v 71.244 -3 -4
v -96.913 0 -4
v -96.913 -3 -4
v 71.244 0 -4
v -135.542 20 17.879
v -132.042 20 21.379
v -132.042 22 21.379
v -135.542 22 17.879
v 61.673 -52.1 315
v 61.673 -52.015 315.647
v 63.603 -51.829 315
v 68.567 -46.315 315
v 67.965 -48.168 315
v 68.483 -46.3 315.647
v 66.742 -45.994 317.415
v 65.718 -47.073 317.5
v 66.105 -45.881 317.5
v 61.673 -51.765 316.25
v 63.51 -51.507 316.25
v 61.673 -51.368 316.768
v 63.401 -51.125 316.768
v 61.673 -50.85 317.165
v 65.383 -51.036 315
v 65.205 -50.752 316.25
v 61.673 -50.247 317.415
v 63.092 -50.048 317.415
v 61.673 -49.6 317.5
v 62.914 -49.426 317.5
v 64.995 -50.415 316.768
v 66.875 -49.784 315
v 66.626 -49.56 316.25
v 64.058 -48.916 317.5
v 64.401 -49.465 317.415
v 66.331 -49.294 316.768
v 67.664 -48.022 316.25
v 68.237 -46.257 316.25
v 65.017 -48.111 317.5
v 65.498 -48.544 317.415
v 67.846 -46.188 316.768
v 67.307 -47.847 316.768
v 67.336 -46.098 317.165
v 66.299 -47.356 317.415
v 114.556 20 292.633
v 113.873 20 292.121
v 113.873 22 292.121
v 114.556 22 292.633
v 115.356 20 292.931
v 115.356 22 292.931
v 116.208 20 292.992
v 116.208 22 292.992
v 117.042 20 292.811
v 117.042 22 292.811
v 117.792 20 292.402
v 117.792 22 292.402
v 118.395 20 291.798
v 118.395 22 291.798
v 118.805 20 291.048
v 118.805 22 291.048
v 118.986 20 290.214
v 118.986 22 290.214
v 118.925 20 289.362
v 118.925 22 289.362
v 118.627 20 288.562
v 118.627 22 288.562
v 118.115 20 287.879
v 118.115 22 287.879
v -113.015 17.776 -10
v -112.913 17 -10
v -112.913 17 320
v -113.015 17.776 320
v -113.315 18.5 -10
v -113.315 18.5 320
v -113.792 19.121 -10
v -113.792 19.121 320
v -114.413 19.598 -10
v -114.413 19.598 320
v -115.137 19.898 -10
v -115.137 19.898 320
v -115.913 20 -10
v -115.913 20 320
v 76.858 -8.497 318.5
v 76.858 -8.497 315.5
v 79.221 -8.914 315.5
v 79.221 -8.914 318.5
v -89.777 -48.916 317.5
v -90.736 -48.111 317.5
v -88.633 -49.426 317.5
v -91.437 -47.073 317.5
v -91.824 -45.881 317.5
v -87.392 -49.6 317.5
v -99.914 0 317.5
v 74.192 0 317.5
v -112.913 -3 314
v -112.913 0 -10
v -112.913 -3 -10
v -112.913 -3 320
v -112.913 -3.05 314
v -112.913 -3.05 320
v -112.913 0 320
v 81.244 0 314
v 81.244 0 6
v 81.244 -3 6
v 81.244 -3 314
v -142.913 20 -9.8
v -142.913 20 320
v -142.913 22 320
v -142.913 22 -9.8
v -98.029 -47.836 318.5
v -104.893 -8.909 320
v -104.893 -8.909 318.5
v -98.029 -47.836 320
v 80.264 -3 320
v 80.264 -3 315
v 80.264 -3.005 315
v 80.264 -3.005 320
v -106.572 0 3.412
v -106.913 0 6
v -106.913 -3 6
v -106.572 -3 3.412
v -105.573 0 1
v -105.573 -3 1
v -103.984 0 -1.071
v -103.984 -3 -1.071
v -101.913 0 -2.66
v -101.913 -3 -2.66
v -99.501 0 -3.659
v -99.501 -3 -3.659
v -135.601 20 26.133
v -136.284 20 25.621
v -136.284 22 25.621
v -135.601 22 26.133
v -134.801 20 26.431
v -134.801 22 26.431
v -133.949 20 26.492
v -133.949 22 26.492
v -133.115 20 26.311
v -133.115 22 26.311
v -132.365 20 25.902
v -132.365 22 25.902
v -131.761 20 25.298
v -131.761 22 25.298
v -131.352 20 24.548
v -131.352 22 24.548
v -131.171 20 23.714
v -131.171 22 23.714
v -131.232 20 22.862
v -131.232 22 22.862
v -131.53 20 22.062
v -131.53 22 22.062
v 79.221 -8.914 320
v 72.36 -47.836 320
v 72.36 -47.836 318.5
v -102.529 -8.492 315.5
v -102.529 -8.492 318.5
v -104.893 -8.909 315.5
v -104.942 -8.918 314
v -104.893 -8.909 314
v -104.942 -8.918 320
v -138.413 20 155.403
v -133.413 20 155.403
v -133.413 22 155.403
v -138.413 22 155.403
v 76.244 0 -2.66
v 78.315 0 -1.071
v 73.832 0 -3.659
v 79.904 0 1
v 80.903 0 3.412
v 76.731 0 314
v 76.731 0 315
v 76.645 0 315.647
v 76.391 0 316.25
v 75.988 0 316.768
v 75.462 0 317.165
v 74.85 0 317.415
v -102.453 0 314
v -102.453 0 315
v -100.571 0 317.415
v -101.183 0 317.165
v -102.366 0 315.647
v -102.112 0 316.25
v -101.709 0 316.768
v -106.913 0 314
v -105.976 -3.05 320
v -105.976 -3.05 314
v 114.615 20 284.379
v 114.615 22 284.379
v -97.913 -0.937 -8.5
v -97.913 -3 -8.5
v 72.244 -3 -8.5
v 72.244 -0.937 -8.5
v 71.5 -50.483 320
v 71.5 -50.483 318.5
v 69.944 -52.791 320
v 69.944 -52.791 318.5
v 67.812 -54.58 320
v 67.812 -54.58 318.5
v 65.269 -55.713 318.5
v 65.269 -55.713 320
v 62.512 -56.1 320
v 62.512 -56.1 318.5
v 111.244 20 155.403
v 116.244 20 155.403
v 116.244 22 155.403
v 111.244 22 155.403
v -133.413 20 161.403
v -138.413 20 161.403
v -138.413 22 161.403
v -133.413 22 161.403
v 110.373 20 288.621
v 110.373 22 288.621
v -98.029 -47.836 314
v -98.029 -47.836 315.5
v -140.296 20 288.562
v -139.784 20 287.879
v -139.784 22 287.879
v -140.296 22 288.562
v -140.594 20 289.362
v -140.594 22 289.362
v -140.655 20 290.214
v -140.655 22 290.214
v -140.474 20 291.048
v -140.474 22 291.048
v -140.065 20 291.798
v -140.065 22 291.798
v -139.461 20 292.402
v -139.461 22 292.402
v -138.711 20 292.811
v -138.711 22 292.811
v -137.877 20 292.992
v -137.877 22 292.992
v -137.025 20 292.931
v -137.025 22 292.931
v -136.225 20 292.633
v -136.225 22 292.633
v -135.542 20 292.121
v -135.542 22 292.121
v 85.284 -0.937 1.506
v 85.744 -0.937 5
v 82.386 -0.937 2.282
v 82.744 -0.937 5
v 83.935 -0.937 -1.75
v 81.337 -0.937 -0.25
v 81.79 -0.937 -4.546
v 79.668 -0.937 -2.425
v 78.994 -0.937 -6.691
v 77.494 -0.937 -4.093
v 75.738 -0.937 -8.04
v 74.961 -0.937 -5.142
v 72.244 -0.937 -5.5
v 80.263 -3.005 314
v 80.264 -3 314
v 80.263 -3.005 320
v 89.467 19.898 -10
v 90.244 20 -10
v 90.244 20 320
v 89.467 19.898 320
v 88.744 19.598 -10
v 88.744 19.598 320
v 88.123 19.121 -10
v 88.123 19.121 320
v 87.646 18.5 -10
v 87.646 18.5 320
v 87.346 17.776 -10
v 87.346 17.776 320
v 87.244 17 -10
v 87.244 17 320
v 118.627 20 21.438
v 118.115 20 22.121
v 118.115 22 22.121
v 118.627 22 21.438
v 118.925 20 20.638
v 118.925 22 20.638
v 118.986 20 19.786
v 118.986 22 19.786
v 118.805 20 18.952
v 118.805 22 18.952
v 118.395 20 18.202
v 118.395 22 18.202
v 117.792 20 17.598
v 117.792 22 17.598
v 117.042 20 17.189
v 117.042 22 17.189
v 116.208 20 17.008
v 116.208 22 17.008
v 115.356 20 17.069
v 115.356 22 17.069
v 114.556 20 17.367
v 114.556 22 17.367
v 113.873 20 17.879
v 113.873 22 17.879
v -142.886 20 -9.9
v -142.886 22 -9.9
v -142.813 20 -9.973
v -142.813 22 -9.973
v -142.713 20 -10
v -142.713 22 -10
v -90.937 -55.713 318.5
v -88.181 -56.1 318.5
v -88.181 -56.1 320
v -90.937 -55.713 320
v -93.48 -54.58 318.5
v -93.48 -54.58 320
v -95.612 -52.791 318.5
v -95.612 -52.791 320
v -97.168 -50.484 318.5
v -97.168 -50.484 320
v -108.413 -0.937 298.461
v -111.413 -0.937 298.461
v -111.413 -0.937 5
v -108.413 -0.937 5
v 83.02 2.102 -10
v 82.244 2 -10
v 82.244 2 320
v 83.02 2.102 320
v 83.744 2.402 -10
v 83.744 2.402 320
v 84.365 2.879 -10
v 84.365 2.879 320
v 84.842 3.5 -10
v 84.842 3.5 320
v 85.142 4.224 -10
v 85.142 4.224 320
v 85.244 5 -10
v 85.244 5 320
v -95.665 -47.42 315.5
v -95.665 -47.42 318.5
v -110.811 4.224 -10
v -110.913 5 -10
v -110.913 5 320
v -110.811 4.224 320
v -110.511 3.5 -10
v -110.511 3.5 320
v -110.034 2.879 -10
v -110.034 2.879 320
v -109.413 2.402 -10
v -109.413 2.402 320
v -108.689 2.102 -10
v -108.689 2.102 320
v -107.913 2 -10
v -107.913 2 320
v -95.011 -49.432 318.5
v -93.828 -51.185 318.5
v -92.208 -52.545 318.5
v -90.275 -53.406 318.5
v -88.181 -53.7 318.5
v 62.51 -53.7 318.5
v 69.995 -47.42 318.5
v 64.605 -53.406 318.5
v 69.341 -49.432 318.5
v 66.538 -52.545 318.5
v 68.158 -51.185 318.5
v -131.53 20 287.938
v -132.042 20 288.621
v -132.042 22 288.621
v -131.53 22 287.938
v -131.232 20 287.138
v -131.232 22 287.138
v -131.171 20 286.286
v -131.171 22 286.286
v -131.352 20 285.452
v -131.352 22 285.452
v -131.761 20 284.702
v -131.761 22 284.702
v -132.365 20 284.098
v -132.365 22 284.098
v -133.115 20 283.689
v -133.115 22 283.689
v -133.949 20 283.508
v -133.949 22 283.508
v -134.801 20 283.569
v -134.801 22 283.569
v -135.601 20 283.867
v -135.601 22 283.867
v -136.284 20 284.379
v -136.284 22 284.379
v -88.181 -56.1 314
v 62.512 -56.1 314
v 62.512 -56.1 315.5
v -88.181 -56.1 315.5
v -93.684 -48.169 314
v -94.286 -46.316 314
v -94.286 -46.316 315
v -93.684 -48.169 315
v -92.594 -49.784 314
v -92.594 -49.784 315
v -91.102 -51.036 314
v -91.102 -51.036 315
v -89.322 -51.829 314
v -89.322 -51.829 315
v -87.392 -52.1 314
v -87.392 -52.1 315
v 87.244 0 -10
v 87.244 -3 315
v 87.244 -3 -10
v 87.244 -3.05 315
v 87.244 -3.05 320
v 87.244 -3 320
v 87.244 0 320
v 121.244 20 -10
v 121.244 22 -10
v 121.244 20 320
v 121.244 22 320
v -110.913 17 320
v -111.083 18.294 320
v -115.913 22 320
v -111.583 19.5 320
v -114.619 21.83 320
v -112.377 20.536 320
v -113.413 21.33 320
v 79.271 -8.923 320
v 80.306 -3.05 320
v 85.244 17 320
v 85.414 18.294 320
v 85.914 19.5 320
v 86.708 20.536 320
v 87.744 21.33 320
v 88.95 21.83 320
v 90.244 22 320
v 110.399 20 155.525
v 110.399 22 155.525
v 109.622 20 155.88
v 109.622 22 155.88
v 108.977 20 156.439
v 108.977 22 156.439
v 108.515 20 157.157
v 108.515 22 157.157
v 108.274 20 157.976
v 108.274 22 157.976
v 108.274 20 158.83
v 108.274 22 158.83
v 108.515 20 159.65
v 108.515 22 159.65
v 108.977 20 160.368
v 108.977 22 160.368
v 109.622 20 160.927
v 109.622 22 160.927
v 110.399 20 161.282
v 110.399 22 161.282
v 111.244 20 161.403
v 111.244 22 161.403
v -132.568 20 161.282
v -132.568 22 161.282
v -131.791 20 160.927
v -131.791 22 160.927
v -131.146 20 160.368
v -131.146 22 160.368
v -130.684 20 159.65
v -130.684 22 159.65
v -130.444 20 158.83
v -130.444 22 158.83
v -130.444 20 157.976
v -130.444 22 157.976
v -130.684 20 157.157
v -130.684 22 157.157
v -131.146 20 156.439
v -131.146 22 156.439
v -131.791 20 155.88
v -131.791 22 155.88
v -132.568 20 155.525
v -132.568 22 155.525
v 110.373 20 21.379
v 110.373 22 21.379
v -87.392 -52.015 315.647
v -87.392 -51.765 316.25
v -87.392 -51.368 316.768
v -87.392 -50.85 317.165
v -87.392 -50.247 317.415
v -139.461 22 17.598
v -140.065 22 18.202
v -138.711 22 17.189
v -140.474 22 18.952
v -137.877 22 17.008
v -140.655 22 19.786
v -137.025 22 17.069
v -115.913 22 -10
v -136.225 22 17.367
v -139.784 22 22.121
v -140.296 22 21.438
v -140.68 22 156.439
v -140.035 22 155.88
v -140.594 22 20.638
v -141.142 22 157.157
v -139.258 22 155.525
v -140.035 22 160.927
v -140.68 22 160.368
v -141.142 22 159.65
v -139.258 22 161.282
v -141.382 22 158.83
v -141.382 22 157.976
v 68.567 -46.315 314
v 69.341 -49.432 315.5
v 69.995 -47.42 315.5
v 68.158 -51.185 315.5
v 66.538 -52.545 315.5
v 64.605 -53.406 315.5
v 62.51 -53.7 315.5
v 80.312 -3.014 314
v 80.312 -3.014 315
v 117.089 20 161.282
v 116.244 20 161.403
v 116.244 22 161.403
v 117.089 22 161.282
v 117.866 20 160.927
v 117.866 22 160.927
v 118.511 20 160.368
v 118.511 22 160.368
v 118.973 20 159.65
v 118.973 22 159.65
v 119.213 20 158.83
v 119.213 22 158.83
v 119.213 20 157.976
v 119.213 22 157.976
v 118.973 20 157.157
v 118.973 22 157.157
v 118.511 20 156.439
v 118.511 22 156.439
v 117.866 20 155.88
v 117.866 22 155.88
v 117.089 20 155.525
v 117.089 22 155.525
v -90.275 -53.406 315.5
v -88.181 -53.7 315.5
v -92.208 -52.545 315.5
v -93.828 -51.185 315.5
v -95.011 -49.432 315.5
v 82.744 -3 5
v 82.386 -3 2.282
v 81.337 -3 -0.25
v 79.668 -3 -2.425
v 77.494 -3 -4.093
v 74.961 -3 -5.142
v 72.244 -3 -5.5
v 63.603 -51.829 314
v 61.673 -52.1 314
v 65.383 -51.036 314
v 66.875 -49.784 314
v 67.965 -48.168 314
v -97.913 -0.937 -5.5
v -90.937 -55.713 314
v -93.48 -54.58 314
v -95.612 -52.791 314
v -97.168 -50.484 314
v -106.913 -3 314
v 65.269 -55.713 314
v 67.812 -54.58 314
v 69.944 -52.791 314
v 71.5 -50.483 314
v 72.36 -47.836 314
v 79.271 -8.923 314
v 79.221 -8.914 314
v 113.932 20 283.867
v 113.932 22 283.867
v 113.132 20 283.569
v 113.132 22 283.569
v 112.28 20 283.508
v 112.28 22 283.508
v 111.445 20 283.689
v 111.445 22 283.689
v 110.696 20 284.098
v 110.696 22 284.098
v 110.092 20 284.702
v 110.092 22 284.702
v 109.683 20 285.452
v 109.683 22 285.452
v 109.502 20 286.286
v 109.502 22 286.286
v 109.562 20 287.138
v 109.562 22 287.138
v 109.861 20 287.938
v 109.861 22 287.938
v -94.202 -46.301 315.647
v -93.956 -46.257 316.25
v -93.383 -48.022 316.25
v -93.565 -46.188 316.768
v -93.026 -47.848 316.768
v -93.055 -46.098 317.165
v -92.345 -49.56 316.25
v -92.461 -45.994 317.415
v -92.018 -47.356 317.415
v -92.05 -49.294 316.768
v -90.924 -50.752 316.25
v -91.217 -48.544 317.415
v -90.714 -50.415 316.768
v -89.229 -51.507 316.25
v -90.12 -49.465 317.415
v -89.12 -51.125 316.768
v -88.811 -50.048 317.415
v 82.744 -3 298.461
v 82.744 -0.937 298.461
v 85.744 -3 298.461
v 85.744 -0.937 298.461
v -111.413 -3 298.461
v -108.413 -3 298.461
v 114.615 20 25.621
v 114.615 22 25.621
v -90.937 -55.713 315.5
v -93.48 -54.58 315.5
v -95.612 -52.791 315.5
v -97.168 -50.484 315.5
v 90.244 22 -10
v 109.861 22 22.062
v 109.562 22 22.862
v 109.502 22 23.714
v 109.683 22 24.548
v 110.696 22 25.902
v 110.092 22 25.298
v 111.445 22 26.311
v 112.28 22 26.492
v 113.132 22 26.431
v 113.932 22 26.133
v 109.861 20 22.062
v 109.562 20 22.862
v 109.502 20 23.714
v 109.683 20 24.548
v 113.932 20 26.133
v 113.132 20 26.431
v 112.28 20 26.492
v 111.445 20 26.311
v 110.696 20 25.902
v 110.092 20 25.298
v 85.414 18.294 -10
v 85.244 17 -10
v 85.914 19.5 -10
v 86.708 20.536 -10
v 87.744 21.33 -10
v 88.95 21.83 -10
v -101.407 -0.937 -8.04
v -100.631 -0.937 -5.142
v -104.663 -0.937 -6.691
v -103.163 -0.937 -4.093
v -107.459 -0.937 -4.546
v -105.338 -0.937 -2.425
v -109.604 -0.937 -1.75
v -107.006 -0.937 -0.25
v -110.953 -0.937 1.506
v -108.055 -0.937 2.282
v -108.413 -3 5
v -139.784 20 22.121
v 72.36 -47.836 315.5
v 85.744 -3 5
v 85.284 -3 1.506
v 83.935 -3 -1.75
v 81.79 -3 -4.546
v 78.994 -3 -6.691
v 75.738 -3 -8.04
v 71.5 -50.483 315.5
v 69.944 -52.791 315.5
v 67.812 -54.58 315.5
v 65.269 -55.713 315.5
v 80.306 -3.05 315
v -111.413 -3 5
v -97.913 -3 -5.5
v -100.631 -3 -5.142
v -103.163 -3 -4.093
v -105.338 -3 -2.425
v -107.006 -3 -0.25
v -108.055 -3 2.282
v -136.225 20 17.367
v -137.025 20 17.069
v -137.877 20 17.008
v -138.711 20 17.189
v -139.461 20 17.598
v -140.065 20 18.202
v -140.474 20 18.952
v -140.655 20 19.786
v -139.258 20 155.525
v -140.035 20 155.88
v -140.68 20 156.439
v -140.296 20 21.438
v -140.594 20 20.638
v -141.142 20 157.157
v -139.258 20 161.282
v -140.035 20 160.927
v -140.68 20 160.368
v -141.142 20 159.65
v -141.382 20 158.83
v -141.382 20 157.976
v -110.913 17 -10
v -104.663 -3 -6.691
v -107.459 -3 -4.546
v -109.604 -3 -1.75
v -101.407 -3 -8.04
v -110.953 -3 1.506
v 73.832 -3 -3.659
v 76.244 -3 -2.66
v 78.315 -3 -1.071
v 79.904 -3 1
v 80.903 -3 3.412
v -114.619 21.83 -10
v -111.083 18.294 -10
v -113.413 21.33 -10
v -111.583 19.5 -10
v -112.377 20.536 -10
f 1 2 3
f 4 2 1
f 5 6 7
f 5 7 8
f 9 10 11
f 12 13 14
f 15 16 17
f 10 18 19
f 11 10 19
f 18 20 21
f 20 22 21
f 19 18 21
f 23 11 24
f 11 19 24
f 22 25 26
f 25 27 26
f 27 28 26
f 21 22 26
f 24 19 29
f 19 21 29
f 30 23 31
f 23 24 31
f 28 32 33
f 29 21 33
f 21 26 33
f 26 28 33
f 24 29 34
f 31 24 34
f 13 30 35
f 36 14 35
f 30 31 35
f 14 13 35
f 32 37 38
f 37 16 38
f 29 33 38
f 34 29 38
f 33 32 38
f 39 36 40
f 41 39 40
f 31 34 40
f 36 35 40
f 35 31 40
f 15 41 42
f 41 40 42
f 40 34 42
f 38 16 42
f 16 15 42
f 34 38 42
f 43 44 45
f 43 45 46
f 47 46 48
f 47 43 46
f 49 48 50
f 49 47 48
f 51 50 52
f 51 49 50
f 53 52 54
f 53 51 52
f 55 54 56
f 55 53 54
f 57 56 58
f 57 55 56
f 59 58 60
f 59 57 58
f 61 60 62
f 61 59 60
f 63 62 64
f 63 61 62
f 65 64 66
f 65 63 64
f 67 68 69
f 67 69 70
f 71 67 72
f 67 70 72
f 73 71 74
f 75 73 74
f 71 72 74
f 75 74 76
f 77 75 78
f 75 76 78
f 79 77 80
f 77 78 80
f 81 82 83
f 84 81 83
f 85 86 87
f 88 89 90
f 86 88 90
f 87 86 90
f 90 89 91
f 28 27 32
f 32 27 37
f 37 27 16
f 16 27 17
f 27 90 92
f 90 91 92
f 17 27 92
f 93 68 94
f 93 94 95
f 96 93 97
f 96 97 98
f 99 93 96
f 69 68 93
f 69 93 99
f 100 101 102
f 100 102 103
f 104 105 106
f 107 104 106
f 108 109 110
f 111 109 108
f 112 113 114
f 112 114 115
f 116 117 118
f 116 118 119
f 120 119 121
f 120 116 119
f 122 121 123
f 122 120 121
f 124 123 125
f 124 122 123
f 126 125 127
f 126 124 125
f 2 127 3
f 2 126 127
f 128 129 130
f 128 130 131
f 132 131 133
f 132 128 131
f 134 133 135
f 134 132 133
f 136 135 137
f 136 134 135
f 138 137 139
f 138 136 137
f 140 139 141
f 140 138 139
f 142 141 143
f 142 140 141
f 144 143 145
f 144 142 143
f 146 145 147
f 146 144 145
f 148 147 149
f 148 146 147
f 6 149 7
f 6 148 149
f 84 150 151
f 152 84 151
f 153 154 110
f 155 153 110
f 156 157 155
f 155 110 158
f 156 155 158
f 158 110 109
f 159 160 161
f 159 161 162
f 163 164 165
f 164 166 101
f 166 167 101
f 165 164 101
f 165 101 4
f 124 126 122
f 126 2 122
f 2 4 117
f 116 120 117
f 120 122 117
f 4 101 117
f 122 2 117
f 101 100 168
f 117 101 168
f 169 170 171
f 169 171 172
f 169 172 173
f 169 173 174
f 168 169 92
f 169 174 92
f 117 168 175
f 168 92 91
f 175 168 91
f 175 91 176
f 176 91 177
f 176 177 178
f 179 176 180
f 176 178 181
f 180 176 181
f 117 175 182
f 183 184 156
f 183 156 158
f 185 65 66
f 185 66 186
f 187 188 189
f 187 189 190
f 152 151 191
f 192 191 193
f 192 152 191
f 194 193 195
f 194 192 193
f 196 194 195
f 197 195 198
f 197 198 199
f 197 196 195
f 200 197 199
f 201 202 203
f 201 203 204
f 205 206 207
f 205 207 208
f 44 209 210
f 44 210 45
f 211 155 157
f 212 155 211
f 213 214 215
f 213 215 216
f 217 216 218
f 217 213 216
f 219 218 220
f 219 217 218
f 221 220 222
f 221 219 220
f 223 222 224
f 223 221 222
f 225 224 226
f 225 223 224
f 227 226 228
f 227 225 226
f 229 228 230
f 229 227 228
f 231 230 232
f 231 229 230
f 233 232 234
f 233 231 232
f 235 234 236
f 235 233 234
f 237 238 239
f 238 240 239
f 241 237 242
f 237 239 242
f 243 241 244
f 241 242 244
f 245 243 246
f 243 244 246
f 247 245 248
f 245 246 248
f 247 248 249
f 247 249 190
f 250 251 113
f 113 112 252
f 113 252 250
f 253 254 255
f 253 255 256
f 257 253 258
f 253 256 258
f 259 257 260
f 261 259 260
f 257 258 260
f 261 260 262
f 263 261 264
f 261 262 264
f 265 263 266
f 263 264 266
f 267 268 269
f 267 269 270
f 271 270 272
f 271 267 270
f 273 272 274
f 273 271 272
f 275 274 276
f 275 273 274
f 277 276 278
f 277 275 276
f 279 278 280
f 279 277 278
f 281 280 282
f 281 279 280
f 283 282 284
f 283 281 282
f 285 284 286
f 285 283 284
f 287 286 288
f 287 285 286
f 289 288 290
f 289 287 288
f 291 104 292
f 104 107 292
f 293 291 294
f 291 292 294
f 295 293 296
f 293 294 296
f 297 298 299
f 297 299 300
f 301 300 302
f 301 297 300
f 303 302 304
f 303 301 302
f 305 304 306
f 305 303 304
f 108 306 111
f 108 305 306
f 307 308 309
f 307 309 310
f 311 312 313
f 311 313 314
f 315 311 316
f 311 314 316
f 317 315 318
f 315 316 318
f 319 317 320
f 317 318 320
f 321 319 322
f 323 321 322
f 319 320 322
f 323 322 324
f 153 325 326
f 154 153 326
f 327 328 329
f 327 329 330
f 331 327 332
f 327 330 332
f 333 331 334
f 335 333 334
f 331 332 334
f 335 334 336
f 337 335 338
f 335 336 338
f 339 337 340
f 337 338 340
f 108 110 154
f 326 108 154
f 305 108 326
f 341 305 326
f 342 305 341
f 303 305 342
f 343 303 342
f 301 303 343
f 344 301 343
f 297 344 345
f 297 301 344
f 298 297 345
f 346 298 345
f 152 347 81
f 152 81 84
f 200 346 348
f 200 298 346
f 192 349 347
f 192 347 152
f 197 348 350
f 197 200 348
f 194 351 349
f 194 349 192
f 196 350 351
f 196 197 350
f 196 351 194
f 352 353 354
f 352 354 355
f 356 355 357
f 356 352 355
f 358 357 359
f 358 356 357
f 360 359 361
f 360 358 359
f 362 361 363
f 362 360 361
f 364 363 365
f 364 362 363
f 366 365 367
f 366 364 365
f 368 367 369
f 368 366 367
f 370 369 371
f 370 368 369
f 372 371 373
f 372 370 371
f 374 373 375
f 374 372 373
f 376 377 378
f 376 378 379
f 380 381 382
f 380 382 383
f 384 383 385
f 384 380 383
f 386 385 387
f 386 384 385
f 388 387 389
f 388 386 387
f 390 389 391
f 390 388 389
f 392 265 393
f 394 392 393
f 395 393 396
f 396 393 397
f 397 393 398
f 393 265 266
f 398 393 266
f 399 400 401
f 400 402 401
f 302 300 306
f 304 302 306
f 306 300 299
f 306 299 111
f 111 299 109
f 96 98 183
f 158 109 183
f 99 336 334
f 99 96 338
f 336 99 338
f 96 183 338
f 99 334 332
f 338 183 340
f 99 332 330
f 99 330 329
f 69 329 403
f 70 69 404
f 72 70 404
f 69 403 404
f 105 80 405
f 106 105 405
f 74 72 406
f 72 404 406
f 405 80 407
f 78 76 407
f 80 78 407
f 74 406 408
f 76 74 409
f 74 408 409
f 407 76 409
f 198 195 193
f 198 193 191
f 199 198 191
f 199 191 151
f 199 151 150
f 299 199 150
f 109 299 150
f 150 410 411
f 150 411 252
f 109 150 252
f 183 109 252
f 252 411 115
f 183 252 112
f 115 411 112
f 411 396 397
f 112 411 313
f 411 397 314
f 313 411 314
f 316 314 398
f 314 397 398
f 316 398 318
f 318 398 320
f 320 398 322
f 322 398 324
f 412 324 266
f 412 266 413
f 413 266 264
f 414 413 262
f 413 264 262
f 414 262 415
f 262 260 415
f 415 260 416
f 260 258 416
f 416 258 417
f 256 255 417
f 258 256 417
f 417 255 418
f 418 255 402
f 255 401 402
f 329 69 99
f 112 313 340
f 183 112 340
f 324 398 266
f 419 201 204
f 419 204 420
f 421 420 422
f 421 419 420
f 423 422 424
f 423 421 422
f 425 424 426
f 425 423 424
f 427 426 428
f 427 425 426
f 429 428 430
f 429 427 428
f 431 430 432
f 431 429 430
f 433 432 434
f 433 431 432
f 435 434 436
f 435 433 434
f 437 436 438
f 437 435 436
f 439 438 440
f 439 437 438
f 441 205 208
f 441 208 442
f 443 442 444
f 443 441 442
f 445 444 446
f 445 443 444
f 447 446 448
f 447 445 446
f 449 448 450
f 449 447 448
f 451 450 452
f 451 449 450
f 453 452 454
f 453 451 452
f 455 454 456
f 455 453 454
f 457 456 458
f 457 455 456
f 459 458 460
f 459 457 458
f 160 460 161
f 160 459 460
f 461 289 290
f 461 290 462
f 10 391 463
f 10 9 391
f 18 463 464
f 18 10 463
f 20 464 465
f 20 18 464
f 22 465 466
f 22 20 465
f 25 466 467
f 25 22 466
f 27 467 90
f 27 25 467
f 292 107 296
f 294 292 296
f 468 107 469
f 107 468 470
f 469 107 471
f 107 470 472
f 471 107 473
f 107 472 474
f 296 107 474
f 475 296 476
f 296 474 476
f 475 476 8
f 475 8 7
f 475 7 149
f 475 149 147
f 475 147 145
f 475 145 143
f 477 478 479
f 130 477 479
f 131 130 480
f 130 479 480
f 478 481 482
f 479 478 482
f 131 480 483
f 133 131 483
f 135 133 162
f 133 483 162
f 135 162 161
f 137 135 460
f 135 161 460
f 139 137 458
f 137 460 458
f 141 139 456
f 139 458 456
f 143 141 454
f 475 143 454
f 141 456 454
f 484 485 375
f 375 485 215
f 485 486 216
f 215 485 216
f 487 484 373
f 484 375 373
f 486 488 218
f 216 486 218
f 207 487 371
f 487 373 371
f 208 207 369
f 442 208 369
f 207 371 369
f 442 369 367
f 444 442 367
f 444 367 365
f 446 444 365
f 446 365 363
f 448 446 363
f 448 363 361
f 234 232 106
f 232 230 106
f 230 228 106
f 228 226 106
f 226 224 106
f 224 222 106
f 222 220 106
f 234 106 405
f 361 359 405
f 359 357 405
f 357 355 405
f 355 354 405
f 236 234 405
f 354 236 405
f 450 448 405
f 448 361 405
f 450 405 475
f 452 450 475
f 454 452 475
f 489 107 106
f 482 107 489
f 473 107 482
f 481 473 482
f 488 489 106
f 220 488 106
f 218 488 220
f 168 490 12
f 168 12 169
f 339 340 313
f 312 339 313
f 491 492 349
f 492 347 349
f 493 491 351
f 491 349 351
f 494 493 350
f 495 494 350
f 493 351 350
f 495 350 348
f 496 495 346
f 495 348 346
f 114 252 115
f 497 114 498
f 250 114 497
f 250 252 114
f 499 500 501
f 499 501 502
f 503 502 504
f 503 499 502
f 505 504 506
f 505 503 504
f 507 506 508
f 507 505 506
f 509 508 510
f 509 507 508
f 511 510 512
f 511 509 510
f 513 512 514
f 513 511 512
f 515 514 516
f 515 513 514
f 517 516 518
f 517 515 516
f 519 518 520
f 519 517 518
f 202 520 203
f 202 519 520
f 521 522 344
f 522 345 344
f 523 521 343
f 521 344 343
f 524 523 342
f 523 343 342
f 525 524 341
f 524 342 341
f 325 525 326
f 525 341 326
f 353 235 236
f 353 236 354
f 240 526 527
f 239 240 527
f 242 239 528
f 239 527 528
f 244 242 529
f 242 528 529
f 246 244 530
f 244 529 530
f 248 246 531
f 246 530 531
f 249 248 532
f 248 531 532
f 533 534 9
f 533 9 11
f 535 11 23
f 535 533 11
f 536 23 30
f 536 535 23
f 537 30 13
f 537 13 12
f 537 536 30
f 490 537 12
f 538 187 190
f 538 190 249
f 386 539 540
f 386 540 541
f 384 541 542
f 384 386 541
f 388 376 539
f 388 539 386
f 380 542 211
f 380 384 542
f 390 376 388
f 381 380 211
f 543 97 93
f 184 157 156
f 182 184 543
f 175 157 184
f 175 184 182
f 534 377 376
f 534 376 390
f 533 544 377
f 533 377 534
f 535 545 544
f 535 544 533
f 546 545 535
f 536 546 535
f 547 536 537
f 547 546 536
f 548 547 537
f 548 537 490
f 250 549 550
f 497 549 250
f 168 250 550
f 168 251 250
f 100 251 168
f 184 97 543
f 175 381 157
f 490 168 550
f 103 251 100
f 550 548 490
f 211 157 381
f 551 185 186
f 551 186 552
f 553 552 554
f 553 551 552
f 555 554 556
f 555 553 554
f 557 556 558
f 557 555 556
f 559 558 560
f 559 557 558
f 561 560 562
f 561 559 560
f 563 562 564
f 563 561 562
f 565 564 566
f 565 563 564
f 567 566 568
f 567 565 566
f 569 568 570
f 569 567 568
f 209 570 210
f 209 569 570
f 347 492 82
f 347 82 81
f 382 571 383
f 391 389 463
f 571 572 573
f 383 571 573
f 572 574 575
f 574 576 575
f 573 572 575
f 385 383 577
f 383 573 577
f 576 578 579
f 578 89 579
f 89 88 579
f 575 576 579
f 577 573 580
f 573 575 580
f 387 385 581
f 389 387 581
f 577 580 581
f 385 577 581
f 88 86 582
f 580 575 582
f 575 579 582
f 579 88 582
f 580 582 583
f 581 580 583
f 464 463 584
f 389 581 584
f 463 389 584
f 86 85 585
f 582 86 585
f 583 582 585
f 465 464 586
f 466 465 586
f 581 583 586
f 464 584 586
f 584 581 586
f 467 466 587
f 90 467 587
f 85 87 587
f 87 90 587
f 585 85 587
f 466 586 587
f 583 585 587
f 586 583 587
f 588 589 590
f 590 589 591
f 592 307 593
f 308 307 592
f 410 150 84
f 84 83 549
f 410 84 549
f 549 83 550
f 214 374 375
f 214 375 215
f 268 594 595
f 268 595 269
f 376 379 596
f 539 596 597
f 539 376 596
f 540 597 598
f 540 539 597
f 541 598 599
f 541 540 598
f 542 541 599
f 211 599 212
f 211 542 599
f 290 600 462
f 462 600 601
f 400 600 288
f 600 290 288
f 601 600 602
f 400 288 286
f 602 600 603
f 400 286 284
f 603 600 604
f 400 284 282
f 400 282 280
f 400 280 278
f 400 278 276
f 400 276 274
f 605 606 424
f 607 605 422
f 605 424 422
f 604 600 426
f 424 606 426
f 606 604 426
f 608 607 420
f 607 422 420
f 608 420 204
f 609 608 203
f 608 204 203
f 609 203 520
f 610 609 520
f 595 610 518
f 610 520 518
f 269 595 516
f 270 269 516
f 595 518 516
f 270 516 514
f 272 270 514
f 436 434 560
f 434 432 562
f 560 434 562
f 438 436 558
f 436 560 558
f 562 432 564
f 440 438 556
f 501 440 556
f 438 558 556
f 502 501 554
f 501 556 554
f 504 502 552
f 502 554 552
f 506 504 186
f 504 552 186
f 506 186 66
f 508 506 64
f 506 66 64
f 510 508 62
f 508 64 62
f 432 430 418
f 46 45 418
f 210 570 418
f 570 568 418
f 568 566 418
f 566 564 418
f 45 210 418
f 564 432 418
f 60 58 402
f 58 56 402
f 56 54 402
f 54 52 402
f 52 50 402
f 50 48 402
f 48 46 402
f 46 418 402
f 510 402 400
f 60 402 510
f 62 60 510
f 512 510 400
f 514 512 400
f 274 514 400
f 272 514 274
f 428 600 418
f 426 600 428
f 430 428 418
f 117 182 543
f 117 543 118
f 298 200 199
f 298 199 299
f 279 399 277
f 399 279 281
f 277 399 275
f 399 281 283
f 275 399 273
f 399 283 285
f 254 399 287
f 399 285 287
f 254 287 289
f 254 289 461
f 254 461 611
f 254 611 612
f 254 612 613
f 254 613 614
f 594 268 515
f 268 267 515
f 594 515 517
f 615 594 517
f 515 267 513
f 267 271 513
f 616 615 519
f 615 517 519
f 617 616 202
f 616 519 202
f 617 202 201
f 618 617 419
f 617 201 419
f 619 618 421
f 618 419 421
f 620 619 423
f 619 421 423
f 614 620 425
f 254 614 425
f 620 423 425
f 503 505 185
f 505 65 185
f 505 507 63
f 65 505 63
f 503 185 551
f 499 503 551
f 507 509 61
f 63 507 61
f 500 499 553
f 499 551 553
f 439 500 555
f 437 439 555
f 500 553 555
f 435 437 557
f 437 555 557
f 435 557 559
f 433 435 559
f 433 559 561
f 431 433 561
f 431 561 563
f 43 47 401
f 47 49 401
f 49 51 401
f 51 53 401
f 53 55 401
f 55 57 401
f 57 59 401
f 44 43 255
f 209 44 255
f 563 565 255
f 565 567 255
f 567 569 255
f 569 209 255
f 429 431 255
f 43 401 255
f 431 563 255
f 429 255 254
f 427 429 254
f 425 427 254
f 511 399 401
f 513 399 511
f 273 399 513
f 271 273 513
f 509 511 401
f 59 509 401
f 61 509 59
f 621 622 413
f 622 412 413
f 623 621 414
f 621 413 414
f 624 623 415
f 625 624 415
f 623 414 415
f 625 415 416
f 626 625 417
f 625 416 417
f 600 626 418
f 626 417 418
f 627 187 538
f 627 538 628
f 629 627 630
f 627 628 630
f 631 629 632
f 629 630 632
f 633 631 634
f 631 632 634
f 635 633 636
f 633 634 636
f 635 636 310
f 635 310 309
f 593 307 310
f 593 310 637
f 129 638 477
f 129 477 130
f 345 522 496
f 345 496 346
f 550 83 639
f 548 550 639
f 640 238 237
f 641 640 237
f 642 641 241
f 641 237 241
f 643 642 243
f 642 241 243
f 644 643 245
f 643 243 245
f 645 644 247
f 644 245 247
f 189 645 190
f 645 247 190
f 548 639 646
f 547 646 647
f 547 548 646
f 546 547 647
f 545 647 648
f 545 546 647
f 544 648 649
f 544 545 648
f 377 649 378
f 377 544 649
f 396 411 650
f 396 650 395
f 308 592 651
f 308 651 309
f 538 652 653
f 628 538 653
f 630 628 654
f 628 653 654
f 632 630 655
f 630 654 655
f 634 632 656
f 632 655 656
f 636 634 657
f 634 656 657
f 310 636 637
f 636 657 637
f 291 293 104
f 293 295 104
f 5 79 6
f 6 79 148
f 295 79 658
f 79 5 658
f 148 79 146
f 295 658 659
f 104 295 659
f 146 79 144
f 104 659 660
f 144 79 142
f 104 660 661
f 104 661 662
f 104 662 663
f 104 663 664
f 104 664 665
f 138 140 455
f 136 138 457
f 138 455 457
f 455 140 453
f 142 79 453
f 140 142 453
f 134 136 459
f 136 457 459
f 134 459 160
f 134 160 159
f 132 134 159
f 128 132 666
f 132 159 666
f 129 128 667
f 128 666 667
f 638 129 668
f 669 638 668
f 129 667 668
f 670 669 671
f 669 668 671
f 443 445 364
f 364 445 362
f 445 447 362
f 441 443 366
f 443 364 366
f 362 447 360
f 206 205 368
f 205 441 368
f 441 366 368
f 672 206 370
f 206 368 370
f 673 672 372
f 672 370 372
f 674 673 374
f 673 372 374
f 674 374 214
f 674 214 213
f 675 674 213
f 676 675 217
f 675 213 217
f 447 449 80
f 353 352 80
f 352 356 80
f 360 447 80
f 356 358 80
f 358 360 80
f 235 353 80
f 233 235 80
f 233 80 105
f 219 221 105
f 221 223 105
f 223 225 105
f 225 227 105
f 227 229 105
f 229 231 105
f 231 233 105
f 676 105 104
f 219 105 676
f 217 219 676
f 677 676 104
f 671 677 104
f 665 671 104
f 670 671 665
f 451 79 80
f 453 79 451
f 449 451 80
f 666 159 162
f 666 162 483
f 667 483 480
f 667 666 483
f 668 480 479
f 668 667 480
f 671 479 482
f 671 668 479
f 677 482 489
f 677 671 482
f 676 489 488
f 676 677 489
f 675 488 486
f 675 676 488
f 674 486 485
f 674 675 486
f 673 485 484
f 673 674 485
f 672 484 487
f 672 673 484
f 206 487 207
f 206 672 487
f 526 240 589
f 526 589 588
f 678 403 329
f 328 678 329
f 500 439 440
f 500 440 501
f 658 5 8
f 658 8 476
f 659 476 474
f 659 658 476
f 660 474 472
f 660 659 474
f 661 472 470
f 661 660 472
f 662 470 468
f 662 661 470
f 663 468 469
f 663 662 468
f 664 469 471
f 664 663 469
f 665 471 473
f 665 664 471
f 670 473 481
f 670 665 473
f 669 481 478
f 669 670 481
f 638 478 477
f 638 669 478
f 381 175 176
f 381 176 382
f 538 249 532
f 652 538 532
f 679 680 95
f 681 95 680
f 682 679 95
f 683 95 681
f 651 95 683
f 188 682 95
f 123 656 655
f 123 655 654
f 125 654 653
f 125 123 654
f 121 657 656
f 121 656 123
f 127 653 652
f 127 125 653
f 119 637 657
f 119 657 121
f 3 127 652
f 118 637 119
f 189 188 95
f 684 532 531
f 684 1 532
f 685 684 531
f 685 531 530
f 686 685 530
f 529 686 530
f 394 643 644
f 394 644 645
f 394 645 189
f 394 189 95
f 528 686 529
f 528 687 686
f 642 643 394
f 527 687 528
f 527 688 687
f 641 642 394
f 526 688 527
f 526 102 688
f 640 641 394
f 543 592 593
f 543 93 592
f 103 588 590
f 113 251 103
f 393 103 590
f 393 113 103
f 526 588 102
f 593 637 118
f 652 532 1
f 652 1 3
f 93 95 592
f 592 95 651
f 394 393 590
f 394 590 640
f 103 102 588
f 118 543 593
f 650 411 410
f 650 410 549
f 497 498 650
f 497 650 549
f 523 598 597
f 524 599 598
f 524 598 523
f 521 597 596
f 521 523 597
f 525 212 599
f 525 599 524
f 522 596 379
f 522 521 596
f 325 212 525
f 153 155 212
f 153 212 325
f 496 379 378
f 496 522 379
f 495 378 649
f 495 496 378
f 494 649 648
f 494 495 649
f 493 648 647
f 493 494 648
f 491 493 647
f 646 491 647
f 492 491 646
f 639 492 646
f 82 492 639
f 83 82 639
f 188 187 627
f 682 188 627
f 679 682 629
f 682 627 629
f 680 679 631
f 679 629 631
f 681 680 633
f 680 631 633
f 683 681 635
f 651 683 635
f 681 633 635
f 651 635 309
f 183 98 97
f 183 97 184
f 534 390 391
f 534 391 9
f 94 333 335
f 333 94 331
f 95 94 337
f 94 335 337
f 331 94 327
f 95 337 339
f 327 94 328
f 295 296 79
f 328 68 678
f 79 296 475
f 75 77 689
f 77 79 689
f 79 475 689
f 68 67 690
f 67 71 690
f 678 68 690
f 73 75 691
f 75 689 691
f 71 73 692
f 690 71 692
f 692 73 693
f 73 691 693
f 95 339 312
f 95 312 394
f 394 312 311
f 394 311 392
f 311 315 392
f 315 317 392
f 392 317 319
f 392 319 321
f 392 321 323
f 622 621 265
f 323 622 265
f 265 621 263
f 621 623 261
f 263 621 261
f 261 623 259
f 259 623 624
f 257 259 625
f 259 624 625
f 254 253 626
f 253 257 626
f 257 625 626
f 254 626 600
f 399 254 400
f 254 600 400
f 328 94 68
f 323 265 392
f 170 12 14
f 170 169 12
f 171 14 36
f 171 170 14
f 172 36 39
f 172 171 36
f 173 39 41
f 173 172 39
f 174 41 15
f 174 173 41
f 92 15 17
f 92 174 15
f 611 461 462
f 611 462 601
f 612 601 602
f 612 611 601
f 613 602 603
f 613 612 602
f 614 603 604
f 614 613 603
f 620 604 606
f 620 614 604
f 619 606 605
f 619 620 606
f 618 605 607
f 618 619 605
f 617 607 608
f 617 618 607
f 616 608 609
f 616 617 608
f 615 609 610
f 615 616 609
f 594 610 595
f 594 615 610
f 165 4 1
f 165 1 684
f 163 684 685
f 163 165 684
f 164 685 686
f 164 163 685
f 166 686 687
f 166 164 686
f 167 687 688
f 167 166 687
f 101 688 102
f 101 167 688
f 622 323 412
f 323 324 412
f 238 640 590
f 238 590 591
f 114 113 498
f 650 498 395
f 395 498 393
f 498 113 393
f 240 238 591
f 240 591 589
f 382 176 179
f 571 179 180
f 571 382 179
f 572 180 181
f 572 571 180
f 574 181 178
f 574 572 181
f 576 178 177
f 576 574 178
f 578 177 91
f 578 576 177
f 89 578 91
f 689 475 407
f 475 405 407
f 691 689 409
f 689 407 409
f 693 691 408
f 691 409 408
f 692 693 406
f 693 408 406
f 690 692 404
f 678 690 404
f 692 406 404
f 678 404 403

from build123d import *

# Parameters (mm, degrees)
BOSS_EXTRU_1_DEPTH       = 320
BOSS_EXTRU_1_DEPTH_BACK  = 10
ENL_V_MAT_EXTRU_1_DEPTH  = 300
ESQUISSE3_W              = 196.156872589
ESQUISSE3_H              = 6
BOSS_EXTRU_2_DEPTH       = 56.1
ESQUISSE41_W             = 200.156872589
ESQUISSE41_H             = 330
BOSS_EXTRU_9_DEPTH       = 3
ENL_V_MAT_EXTRU_22_DEPTH = 6
CONG_8_R                 = 10
CONG_7_R                 = 0.2
ESQUISSE43_W             = 6.98
ESQUISSE43_H             = 5
BOSS_EXTRU_10_DEPTH      = 0.05
ESQUISSE44_W             = 6
ESQUISSE44_H             = 6
BOSS_EXTRU_11_DEPTH      = 0.05
ESQUISSE45_W             = 6.978514333
ESQUISSE45_H             = 6
BOSS_EXTRU_12_DEPTH      = 0.05
ESQUISSE46_W             = 6
ESQUISSE46_H             = 6
BOSS_EXTRU_13_DEPTH      = 0.05
ENL_V_MAT_EXTRU_23_DEPTH = 3.5
CONG_11_R                = 2.5
ESQUISSE48_W             = 3
ESQUISSE48_H             = 3


with BuildPart() as part:
    # Esquisse1 → Boss.-Extru.1 (new body, two sides)
    with BuildSketch(Plane.XY) as boss_extru_1_sk:
        with BuildLine():
            Line((-107.913003101, 2), (82.243869488, 2))
            ThreePointArc((82.243869488, 2), (84.365189832, 2.878679656), (85.243869488, 5))
            Line((85.243869488, 5), (85.243869488, 17))
            ThreePointArc((85.243869488, 17), (86.708335582, 20.535533906), (90.243869488, 22))
            Line((90.243869488, 22), (116.243869488, 22))
            Line((116.243869488, 22), (121.243869488, 22))
            Line((121.243869488, 22), (121.243869488, 20))
            Line((121.243869488, 20), (116.243869488, 20))
            Line((116.243869488, 20), (90.243869488, 20))
            ThreePointArc((90.243869488, 20), (88.122549145, 19.121320344), (87.243869488, 17))
            Line((87.243869488, 17), (87.243869488, 0))
            Line((87.243869488, 0), (-112.913003101, 0))
            Line((-112.913003101, 0), (-112.913003101, 17))
            ThreePointArc((-112.913003101, 17), (-113.791682758, 19.121320344), (-115.913003101, 20))
            Line((-115.913003101, 20), (-137.913003101, 20))
            Line((-137.913003101, 20), (-142.913003101, 20))
            Line((-142.913003101, 20), (-142.913003101, 22))
            Line((-142.913003101, 22), (-137.913003101, 22))
            Line((-137.913003101, 22), (-115.913003101, 22))
            ThreePointArc((-115.913003101, 22), (-112.377469195, 20.535533906), (-110.913003101, 17))
            Line((-110.913003101, 17), (-110.913003101, 5))
            ThreePointArc((-110.913003101, 5), (-110.034323445, 2.878679656), (-107.913003101, 2))
        make_face()
    extrude(amount=BOSS_EXTRU_1_DEPTH)
    extrude(boss_extru_1_sk.sketch, amount=-BOSS_EXTRU_1_DEPTH_BACK)

    # Esquisse2 → Enlèv. mat.-Extru.1 (cut)
    with BuildSketch(Plane.XZ.offset(-20)):
        with BuildLine():
            Line((-139.784323445, 22.121320344), (-136.284323445, 25.621320344))
            ThreePointArc((-136.284323445, 25.621320344), (-132.041682758, 25.621320344), (-132.041682758, 21.378679656))
            Line((-132.041682758, 21.378679656), (-135.541682758, 17.878679656))
            ThreePointArc((-135.541682758, 17.878679656), (-139.784323445, 17.878679656), (-139.784323445, 22.121320344))
        make_face()
        with BuildLine():
            Line((-136.284323445, 284.378679656), (-139.784323445, 287.878679656))
            ThreePointArc((-139.784323445, 287.878679656), (-139.784323445, 292.121320344), (-135.541682758, 292.121320344))
            Line((-135.541682758, 292.121320344), (-132.041682758, 288.621320344))
            ThreePointArc((-132.041682758, 288.621320344), (-132.041682758, 284.378679656), (-136.284323445, 284.378679656))
        make_face()
        with BuildLine():
            Line((118.115189832, 287.878679656), (114.615189832, 284.378679656))
            ThreePointArc((114.615189832, 284.378679656), (110.372549145, 284.378679656), (110.372549145, 288.621320344))
            Line((110.372549145, 288.621320344), (113.872549145, 292.121320344))
            ThreePointArc((113.872549145, 292.121320344), (118.115189832, 292.121320344), (118.115189832, 287.878679656))
        make_face()
        with BuildLine():
            Line((114.615189832, 25.621320344), (118.115189832, 22.121320344))
            ThreePointArc((118.115189832, 22.121320344), (118.115189832, 17.878679656), (113.872549145, 17.878679656))
            Line((113.872549145, 17.878679656), (110.372549145, 21.378679656))
            ThreePointArc((110.372549145, 21.378679656), (110.372549145, 25.621320344), (114.615189832, 25.621320344))
        make_face()
        with BuildLine():
            Line((116.243869488, 155.403419264), (111.243869488, 155.403419264))
            ThreePointArc((111.243869488, 155.403419264), (108.243869488, 158.403419264), (111.243869488, 161.403419264))
            Line((111.243869488, 161.403419264), (116.243869488, 161.403419264))
            ThreePointArc((116.243869488, 161.403419264), (119.243869488, 158.403419264), (116.243869488, 155.403419264))
        make_face()
        with BuildLine():
            Line((-138.413003101, 161.403419264), (-133.413003101, 161.403419264))
            ThreePointArc((-133.413003101, 161.403419264), (-130.413003101, 158.403419264), (-133.413003101, 155.403419264))
            Line((-133.413003101, 155.403419264), (-138.413003101, 155.403419264))
            ThreePointArc((-138.413003101, 155.403419264), (-141.413003101, 158.403419264), (-138.413003101, 161.403419264))
        make_face()
    extrude(amount=-ENL_V_MAT_EXTRU_1_DEPTH, mode=Mode.SUBTRACT)

    # Esquisse3 → Boss.-Extru.2 (add)
    with BuildSketch(Plane(origin=(0, 0, 0), x_dir=(-1, 0, 0), z_dir=(0, -1, 0))):
        with Locations((12.834566806, -317)):
            Rectangle(ESQUISSE3_W, ESQUISSE3_H)
    extrude(amount=BOSS_EXTRU_2_DEPTH)

    # Esquisse41 → Boss.-Extru.9 (add)
    with BuildSketch(Plane.XZ):
        with Locations((-12.834566806, 155)):
            Rectangle(ESQUISSE41_W, ESQUISSE41_H)
        with BuildLine():
            Line((81.243869488, 314), (-106.913003101, 314))
            Line((-106.913003101, 314), (-106.913003101, 6))
            ThreePointArc((-106.913003101, 6), (-103.984070913, -1.071067812), (-96.913003101, -4))
            Line((-96.913003101, -4), (71.243869488, -4))
            ThreePointArc((71.243869488, -4), (78.3149373, -1.071067812), (81.243869488, 6))
            Line((81.243869488, 6), (81.243869488, 314))
        make_face(mode=Mode.SUBTRACT)
    extrude(amount=BOSS_EXTRU_9_DEPTH)

    # Esquisse24 → Enlèv. mat.-Extru.22 (cut)
    with BuildSketch(Plane.XY.offset(320)):
        Polygon((80.263869488, -3), (69.213869488, -65.686319951), (85.243869488, -65.686319951), (85.243869488, -3), align=None)
        Polygon((-105.934488768, -3), (-94.881199239, -65.686319951), (-110.913003101, -65.686319951), (-110.913003101, -3), align=None)
    extrude(amount=-ENL_V_MAT_EXTRU_22_DEPTH, mode=Mode.SUBTRACT)

    # Congé8
    cong_8_edges = [part.edges().sort_by_distance(p)[0] for p in [
        (-96.571526093, -56.1, 317),
        (70.903693289, -56.1, 317),
    ]]
    fillet(cong_8_edges, radius=CONG_8_R)

    # Congé7
    cong_7_edges = [part.edges().sort_by_distance(p)[0] for p in [
        (-142.913003101, 21, -10),
    ]]
    fillet(cong_7_edges, radius=CONG_7_R)

    # Esquisse43 → Boss.-Extru.10 (add)
    with BuildSketch(Plane.XZ.offset(3)):
        with Locations((83.753869488, 317.5)):
            Rectangle(ESQUISSE43_W, ESQUISSE43_H)
    extrude(amount=BOSS_EXTRU_10_DEPTH)

    # Esquisse44 → Boss.-Extru.11 (add)
    with BuildSketch(Plane(origin=(78.357901362, -13.812500251, 0), x_dir=(0, 0, -1), z_dir=(0.984816589, -0.173598057, 0))):
        with Locations((-317, 7.973810121)):
            Rectangle(ESQUISSE44_W, ESQUISSE44_H)
    extrude(amount=BOSS_EXTRU_11_DEPTH)

    # Esquisse45 → Boss.-Extru.12 (add)
    with BuildSketch(Plane.XZ.offset(3)):
        with Locations((-109.423745935, 317)):
            Rectangle(ESQUISSE45_W, ESQUISSE45_H)
    extrude(amount=BOSS_EXTRU_12_DEPTH)

    # Esquisse46 → Boss.-Extru.13 (add)
    with BuildSketch(Plane(origin=(-103.25320329, -18.206325585, 0), x_dir=(0, 0, 1), z_dir=(-0.984807753, -0.173648178, 0))):
        with Locations((317, 12.440907668)):
            Rectangle(ESQUISSE46_W, ESQUISSE46_H)
    extrude(amount=BOSS_EXTRU_13_DEPTH)

    # Enlèvement de matière-Balayage1: sweep along a path in Esquisse47
    with BuildLine(Plane.XZ.offset(3)) as enl_vement_de_mati_re_balayage1_path:
        Line((84.243869488, 298.46050791), (84.243869488, 5))
        ThreePointArc((84.243869488, 5), (80.729150862, -3.485281374), (72.243869488, -7))
        Line((72.243869488, -7), (-97.913003101, -7))
        ThreePointArc((-97.913003101, -7), (-106.398284476, -3.485281374), (-109.913003101, 5))
        Line((-109.913003101, 5), (-109.913003101, 298.46050791))
    # Esquisse3D1 → Enlèvement de matière-Balayage1 (sweep, cut)
    with BuildSketch(Plane(origin=(-48.798071116, -0.937456497, -5.5), x_dir=(0, -0.624695048, -0.780868809), z_dir=(1, 0, 0))):
        Polygon((0, 0), (1.499268114, -1.874085143), (3.841874542, 0), (2.342606428, 1.874085143), align=None)
    sweep(path=enl_vement_de_mati_re_balayage1_path.line, mode=Mode.SUBTRACT)

    # Esquisse50 → Enlèv. mat.-Extru.23 (cut)
    with BuildSketch(Plane(origin=(0, 0, 314), x_dir=(-1, 0, 0), z_dir=(0, 0, -1))):
        with BuildLine():
            Line((87.39220148, -52.1), (-61.673120332, -52.1))
            ThreePointArc((-61.673120332, -52.1), (-66.172770053, -50.462196601), (-68.566836458, -46.315186396))
            Line((-68.566836458, -46.315186396), (-76.731022999, 0))
            Line((-76.731022999, 0), (102.452534593, 0))
            Line((102.452534593, 0), (94.285855751, -46.315537244))
            ThreePointArc((94.285855751, -46.315537244), (91.891714748, -50.462311102), (87.39220148, -52.1))
        make_face()
    extrude(amount=-ENL_V_MAT_EXTRU_23_DEPTH, mode=Mode.SUBTRACT)

    # Congé11
    cong_11_edges = [part.edges().sort_by_distance(p)[0] for p in [
        (-98.369195172, -23.157768622, 317.5),
        (-91.891714748, -50.462311102, 317.5),
        (-12.859540574, -52.1, 317.5),
        (66.172770053, -50.462196601, 317.5),
        (72.648929728, -23.157593198, 317.5),
    ]]
    fillet(cong_11_edges, radius=CONG_11_R)

    # Enlèvement de matière-Balayage2: sweep along a curve in space
    with BuildLine() as enl_vement_de_mati_re_balayage2_path:
        Line((79.221345133, -8.914209531, 317), (72.358298385, -47.836481777, 317))
        ThreePointArc((72.358298385, -47.836481777, 317), (68.938096952, -53.760444431, 317), (62.510220855, -56.1, 317))
        Line((-8.284645145, -56.1, 317), (62.510220855, -56.1, 317))
        Line((-8.284645145, -56.1, 317), (-88.180529781, -56.1, 317))
        ThreePointArc((-98.028607311, -47.836481777, 317), (-94.608405878, -53.760444431, 317), (-88.180529781, -56.1, 317))
        Line((-104.892599702, -8.908846518, 317), (-98.028607311, -47.836481777, 317))
    # Esquisse48 → Enlèvement de matière-Balayage2 (sweep, cut)
    with BuildSketch(Plane(origin=(0, 0, 0), x_dir=(0, 0, -1), z_dir=(1, 0, 0))):
        with Locations((-317, -55.2)):
            Rectangle(ESQUISSE48_W, ESQUISSE48_H)
    sweep(path=enl_vement_de_mati_re_balayage2_path.line, mode=Mode.SUBTRACT)


solid = part.part
